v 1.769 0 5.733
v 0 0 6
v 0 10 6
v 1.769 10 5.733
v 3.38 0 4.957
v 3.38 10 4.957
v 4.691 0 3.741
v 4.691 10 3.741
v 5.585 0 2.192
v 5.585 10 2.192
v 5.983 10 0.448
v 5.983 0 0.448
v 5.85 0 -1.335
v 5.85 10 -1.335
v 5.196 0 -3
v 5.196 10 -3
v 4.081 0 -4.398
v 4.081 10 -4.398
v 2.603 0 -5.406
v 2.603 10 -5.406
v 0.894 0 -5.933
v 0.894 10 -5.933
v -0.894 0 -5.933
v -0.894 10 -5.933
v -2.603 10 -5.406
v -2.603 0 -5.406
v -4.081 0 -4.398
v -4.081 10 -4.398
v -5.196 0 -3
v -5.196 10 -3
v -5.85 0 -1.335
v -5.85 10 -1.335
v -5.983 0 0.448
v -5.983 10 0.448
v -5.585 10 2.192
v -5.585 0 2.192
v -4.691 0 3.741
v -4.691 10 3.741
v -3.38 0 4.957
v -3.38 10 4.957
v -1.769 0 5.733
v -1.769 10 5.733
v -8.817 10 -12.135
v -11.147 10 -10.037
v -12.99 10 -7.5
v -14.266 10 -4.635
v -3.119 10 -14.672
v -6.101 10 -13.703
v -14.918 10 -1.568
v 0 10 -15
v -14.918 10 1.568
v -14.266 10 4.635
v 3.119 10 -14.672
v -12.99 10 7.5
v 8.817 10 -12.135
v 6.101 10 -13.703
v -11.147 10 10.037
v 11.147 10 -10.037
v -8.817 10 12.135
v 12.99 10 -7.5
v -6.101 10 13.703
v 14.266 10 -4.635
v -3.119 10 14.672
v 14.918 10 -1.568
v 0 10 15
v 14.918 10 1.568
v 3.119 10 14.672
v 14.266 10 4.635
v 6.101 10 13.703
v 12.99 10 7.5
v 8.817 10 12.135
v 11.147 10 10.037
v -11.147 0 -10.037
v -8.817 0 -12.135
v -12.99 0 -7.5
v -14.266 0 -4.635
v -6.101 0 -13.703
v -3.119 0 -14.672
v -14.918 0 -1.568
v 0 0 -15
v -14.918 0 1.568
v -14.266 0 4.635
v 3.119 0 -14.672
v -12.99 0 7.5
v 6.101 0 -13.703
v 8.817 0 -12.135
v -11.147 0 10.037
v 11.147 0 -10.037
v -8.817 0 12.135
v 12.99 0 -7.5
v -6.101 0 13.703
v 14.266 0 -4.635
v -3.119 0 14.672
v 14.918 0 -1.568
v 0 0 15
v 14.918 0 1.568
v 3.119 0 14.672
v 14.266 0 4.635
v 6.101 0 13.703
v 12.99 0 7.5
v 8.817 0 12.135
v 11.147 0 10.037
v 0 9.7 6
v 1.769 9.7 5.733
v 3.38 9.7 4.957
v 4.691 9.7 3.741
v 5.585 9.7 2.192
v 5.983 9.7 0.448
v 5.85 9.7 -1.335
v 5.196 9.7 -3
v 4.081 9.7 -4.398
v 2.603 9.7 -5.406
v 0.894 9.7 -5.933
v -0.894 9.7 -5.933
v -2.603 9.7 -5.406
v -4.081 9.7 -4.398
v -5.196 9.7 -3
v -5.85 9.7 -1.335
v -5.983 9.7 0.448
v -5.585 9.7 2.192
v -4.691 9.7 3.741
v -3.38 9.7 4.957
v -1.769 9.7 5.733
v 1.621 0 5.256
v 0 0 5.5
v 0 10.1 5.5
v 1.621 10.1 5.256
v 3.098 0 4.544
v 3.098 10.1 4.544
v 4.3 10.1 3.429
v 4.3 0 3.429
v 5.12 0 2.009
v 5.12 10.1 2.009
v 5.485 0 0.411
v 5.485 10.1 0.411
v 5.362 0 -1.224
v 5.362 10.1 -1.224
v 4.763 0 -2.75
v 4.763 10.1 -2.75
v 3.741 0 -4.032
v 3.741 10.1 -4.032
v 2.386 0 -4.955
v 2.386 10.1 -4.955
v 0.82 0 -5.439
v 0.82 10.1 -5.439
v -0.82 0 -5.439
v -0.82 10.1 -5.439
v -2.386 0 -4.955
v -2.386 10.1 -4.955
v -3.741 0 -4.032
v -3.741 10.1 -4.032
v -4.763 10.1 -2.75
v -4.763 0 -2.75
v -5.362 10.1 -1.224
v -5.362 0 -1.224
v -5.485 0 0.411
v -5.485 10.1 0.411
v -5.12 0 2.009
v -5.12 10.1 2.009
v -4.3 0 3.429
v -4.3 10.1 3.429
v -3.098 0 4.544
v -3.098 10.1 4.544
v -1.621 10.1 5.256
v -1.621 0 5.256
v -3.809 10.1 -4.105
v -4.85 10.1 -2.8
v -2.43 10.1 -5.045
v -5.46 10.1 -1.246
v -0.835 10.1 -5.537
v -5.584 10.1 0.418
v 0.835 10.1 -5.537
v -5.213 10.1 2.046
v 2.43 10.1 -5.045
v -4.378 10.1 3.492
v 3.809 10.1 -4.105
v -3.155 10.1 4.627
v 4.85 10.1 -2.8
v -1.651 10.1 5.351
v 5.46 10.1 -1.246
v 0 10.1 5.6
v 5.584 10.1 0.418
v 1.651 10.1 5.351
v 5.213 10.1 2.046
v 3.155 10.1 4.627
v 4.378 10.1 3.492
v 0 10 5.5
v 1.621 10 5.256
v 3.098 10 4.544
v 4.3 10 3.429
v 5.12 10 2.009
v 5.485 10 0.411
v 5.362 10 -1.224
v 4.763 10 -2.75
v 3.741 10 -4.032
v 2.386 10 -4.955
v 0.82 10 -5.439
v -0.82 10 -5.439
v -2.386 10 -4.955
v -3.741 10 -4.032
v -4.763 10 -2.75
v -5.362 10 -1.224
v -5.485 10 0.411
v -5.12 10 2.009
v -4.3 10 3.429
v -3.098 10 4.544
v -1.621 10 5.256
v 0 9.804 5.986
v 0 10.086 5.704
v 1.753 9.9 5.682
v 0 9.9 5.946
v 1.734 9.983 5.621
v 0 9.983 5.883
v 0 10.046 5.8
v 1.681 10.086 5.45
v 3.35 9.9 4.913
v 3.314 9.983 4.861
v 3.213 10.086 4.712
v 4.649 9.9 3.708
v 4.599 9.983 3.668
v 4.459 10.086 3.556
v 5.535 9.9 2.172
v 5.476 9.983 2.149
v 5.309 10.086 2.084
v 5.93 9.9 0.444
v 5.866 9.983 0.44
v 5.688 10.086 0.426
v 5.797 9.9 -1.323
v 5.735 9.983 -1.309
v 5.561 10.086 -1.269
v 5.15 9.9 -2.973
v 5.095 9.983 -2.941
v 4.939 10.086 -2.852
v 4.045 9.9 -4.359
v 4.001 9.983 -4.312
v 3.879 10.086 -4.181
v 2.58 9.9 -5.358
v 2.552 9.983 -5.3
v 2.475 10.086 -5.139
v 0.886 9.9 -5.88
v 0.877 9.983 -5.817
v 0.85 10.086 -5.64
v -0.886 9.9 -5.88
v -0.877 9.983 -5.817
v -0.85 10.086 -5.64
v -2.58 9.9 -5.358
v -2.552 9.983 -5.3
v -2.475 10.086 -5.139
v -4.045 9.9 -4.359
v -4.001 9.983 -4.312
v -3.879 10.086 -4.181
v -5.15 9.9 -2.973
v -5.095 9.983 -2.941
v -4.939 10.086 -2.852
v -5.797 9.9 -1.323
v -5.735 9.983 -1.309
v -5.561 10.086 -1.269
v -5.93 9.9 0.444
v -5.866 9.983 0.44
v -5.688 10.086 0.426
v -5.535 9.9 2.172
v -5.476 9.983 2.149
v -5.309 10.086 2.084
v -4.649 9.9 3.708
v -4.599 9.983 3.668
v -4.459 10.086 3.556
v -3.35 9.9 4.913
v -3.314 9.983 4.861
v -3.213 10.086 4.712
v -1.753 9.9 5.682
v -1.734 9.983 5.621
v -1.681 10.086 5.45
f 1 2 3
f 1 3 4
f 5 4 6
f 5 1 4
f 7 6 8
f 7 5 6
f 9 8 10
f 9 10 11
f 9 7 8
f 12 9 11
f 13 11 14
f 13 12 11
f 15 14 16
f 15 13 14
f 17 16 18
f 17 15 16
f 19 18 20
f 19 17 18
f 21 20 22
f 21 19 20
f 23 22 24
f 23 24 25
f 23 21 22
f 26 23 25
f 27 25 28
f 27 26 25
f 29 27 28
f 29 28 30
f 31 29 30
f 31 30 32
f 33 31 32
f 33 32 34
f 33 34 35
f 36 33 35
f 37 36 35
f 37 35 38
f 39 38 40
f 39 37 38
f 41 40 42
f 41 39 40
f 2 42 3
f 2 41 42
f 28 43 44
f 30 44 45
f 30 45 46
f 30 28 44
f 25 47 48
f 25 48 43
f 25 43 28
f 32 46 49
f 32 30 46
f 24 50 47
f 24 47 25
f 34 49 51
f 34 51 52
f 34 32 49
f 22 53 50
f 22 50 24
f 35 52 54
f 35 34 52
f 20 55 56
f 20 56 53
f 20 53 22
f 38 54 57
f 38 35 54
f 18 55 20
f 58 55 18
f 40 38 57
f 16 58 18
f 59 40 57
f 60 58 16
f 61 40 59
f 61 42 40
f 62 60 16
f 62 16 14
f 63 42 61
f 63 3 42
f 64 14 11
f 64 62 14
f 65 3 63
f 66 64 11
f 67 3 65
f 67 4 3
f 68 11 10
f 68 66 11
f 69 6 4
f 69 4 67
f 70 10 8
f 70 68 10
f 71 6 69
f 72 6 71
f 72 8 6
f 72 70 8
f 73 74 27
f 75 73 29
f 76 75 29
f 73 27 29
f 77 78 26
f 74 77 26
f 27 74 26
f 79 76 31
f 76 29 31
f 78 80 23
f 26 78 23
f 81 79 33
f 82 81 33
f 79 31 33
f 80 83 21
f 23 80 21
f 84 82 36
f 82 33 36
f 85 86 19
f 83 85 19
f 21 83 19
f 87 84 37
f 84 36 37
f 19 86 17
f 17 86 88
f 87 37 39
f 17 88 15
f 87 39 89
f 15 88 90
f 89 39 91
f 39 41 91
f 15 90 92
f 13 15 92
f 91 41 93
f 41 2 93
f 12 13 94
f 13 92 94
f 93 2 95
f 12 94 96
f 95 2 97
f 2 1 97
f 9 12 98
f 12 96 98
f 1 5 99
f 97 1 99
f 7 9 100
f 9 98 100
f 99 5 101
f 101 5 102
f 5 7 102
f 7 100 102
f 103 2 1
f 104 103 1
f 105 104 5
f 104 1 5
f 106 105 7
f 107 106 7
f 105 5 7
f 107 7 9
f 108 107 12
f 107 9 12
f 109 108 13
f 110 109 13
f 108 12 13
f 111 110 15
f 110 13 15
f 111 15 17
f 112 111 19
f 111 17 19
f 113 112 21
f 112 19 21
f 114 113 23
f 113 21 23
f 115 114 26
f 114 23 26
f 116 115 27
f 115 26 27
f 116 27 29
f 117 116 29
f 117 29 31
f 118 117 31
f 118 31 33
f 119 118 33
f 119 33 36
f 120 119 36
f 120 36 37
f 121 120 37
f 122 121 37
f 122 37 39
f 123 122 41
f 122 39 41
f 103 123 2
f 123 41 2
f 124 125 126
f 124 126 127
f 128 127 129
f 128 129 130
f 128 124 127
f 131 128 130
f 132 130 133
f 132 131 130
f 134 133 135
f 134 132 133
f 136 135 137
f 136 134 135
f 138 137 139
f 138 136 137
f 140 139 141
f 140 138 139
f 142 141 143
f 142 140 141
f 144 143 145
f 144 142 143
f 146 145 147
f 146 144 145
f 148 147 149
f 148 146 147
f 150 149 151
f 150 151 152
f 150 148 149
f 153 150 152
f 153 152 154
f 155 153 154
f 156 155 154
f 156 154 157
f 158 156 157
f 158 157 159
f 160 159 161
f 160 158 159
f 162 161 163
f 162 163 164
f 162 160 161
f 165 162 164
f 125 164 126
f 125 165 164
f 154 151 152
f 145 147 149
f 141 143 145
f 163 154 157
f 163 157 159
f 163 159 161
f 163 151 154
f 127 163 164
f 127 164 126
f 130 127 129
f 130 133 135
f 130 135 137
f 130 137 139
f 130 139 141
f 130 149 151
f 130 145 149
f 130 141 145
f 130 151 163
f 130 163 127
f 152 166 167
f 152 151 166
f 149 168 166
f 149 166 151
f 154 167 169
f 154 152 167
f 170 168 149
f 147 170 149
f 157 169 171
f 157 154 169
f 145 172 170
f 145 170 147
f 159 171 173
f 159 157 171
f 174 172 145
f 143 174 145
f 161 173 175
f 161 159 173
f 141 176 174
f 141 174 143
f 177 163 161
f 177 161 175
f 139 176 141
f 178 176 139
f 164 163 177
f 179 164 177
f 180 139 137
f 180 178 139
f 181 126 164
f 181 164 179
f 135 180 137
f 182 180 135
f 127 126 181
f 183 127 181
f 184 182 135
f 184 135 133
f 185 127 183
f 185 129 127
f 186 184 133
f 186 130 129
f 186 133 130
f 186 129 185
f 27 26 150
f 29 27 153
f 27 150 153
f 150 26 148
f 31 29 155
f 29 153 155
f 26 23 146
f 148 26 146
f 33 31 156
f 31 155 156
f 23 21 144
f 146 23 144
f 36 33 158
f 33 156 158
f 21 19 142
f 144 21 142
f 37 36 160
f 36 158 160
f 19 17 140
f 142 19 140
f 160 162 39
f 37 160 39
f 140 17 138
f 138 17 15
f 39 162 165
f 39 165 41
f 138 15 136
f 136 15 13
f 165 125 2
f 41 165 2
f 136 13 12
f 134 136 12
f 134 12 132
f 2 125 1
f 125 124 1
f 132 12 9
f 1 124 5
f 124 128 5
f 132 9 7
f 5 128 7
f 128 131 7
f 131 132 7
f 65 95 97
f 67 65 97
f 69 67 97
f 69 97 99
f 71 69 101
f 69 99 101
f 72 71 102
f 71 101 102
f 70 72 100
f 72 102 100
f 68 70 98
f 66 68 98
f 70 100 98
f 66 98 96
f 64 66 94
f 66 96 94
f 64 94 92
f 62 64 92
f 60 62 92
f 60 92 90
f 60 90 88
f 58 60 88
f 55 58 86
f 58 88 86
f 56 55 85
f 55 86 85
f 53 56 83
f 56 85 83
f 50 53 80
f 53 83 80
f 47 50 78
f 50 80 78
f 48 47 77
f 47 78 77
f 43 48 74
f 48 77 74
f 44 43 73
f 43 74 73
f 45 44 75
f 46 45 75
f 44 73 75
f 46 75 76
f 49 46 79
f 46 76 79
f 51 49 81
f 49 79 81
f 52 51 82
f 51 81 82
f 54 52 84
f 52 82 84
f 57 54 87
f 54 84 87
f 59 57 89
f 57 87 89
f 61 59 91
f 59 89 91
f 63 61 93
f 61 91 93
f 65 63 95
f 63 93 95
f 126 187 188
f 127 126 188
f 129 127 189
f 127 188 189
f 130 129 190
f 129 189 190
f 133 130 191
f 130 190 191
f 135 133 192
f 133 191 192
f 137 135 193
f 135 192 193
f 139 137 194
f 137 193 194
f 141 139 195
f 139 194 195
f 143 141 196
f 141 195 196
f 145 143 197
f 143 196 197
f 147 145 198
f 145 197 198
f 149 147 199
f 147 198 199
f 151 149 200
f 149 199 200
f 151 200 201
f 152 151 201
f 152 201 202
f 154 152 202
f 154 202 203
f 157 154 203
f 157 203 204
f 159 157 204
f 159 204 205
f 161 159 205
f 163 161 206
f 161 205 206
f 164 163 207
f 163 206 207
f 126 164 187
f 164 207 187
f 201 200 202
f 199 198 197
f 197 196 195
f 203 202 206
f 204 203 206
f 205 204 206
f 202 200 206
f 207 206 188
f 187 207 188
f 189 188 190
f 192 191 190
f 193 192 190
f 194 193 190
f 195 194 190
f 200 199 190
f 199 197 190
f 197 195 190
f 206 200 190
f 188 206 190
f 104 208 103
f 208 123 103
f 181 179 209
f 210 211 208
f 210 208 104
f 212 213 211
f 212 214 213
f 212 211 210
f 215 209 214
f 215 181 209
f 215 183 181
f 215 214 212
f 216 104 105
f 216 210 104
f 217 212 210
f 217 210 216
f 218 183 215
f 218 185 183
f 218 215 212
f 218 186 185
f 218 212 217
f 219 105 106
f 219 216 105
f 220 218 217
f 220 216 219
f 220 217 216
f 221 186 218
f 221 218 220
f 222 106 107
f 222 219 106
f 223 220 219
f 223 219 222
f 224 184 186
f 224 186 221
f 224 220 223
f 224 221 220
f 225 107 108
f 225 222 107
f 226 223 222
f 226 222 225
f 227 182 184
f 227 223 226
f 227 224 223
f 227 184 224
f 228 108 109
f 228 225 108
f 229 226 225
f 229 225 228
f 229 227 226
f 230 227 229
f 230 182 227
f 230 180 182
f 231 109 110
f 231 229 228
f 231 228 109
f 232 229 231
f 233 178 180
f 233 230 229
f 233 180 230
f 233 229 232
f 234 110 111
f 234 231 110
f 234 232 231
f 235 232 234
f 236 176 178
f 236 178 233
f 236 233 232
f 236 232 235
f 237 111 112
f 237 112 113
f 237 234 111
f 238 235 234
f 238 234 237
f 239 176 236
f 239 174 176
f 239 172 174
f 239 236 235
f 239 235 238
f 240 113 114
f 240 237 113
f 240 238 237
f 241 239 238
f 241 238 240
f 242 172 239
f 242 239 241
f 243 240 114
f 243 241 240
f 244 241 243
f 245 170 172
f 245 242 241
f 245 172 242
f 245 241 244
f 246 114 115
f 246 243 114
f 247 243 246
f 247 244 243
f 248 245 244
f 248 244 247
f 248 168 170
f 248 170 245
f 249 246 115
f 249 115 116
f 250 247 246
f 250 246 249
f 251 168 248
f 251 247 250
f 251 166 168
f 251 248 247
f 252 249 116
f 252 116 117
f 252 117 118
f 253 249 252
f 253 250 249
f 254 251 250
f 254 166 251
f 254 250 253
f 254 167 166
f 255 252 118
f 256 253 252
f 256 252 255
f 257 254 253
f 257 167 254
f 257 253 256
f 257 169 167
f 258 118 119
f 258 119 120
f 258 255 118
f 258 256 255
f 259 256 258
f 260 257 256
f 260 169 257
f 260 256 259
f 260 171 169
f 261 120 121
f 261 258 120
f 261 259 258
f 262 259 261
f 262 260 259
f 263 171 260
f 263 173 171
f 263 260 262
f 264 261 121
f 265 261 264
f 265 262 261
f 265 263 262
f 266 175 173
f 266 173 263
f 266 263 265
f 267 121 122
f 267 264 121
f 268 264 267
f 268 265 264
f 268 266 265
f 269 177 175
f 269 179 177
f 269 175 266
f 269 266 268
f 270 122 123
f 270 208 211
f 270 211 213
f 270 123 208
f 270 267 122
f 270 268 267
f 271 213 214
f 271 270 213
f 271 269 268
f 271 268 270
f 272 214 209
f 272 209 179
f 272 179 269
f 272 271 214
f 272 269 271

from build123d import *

# Parameters (mm, degrees)
SKETCH1_R           = 15
SKETCH1_R_2         = 6
BOSS_EXTRUDE1_DEPTH = 10
SKETCH2_R           = 6
SKETCH2_R_2         = 5.5
BOSS_EXTRUDE2_DEPTH = 10.1
FILLET1_R           = 0.4
SKETCH3_R           = 5.5
BOSS_EXTRUDE3_DEPTH = 0.1


with BuildPart() as part:
    # Sketch1 → Boss-Extrude1 (new body)
    with BuildSketch(Plane(origin=(0, 0, 0), x_dir=(1, 0, 0), z_dir=(0, 1, 0))):
        with Locations(Location((0, 0, 0), (0, 0, 270))):
            Circle(SKETCH1_R)
        with Locations(Location((0, 0, 0), (0, 0, 270))):
            Circle(SKETCH1_R_2, mode=Mode.SUBTRACT)
    extrude(amount=BOSS_EXTRUDE1_DEPTH)


with BuildPart() as body_2:
    # Sketch2 → Boss-Extrude2 (new body)
    with BuildSketch(Plane(origin=(0, 0, 0), x_dir=(1, 0, 0), z_dir=(0, 1, 0))):
        with Locations(Location((0, 0, 0), (0, 0, 270))):
            Circle(SKETCH2_R)
        with Locations(Location((0, 0, 0), (0, 0, 270))):
            Circle(SKETCH2_R_2, mode=Mode.SUBTRACT)
    extrude(amount=BOSS_EXTRUDE2_DEPTH)

    # Fillet1
    fillet1_edges = [body_2.edges().sort_by_distance(p)[0] for p in [
        (0, 10.1, -6),
    ]]
    fillet(fillet1_edges, radius=FILLET1_R)


with BuildPart() as body_3:
    # Sketch3 → Boss-Extrude3 (new body)
    with BuildSketch(Plane(origin=(0, 10, 0), x_dir=(1, 0, 0), z_dir=(0, 1, 0))):
        with Locations(Location((0, 0, 0), (0, 0, 270))):
            Circle(SKETCH3_R)
    extrude(amount=BOSS_EXTRUDE3_DEPTH)


solid = Compound([part.part, body_2.part, body_3.part])
